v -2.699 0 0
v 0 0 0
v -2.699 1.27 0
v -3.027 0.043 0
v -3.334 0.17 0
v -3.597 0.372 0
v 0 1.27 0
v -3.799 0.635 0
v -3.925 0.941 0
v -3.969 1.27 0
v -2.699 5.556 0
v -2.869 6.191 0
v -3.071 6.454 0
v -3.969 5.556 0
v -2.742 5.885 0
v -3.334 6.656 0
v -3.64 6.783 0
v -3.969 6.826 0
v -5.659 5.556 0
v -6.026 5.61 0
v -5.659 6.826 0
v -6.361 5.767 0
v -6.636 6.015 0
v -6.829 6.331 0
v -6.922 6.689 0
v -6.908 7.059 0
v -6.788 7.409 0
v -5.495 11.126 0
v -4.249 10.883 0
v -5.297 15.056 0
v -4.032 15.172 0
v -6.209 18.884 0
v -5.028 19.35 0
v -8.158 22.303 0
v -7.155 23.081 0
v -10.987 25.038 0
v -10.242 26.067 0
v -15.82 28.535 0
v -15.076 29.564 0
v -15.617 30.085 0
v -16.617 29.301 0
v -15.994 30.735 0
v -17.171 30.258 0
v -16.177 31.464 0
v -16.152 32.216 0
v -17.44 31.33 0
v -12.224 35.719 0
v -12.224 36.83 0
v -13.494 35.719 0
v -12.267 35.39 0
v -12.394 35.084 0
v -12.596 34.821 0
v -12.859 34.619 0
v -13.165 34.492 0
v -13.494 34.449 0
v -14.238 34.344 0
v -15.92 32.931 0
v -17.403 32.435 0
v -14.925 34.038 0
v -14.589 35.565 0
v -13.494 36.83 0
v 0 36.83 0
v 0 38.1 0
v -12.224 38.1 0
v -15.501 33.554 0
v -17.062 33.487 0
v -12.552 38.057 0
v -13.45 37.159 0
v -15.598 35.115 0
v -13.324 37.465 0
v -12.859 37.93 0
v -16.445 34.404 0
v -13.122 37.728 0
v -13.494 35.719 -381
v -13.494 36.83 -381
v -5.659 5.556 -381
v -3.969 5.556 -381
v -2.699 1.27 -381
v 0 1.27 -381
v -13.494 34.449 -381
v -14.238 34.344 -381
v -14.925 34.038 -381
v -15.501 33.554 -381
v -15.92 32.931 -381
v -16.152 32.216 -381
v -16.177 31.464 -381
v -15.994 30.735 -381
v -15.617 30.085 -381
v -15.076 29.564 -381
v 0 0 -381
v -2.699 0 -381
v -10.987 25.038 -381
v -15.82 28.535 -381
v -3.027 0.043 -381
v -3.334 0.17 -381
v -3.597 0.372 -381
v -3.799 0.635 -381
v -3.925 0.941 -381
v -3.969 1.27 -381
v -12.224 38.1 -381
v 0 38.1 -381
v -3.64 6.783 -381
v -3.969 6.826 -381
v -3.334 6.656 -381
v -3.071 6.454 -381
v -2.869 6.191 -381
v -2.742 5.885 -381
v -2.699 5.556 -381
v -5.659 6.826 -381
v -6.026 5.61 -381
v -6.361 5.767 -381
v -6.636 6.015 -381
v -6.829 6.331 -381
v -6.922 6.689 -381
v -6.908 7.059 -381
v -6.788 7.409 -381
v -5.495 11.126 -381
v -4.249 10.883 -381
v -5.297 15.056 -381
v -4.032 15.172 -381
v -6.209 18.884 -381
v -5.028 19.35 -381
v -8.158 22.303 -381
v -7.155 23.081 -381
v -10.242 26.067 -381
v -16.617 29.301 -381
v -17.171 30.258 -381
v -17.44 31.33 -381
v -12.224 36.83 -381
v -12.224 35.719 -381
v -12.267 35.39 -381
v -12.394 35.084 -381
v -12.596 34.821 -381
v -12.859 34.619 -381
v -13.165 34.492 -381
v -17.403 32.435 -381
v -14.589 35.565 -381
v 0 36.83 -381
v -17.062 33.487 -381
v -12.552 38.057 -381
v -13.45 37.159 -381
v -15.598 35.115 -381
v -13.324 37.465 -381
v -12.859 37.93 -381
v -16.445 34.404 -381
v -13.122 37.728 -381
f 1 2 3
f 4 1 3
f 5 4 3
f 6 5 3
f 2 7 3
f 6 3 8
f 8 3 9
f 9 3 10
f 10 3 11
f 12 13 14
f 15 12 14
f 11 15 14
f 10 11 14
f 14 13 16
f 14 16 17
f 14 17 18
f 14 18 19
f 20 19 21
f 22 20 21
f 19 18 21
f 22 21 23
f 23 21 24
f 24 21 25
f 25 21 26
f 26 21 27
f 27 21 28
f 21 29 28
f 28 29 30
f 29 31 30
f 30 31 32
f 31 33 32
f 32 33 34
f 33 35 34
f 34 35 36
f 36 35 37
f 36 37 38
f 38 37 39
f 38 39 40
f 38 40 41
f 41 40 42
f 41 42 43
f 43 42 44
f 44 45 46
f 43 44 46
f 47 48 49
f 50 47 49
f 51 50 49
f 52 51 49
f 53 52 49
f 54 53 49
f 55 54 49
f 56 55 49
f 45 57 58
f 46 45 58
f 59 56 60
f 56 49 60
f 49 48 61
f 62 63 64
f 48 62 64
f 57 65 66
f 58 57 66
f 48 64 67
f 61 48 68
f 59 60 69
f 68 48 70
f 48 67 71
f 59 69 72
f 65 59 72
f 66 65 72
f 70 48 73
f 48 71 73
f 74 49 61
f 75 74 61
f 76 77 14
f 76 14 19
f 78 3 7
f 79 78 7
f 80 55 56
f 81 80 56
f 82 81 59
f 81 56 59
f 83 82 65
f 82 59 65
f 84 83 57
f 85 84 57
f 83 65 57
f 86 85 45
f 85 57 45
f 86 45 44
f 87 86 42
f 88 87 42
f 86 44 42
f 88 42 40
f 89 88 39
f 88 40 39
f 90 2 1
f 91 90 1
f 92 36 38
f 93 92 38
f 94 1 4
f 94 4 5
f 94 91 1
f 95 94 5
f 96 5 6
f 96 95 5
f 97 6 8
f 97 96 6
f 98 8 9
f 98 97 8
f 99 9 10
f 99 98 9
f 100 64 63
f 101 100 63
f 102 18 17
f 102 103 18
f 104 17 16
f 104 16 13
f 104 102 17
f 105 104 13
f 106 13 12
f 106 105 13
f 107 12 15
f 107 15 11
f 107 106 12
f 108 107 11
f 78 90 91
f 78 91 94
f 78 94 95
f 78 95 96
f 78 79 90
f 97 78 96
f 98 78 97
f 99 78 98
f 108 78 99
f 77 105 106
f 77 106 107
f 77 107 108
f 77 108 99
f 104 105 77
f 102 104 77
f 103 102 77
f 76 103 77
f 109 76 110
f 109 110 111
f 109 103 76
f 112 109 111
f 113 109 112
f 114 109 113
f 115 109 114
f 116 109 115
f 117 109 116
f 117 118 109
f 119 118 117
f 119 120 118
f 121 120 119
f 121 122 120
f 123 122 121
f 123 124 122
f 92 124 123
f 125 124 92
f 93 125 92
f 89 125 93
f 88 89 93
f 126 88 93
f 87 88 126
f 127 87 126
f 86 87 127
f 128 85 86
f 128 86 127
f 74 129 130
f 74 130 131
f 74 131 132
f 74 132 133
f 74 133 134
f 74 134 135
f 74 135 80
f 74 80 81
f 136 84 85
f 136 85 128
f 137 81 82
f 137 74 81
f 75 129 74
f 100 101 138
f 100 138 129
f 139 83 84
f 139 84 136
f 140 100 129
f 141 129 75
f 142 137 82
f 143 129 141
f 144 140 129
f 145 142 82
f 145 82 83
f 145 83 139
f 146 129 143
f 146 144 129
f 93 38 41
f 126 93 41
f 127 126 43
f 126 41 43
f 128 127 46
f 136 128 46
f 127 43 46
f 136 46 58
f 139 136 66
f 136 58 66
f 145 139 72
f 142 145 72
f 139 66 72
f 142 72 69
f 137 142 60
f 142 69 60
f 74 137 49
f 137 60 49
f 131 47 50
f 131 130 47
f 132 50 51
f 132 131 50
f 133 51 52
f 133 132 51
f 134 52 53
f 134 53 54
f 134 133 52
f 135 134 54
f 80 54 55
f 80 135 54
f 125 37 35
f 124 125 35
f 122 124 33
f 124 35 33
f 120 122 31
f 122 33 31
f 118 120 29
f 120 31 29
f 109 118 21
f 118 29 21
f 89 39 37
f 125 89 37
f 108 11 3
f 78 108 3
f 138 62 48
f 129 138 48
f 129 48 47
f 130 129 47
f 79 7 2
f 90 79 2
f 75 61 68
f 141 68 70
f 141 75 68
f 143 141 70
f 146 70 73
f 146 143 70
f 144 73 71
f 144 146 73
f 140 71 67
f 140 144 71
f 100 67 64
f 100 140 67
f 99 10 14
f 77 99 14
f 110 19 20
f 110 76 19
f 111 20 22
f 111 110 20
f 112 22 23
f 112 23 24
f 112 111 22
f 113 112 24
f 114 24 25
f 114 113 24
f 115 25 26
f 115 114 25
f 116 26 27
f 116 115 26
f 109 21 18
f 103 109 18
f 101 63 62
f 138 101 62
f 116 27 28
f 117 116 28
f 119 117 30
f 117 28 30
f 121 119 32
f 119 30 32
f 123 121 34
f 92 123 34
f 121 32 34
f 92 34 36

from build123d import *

# Parameters (mm, degrees)
EXTRUDE_THIN1_DEPTH = 381
FILLET1_R           = 1.27


with BuildPart() as part:
    # Sketch1 → Extrude-Thin1 (new body)
    with BuildSketch(Plane.XY):
        with BuildLine():
            Line((0, 0), (-3.96875, 0))
            Line((-3.96875, 0), (-3.96875, 5.55625))
            Line((-3.96875, 5.55625), (-7.9375, 5.55625))
            ThreePointArc((-7.9375, 5.55625), (-5.405853735, 15.931849892), (-10.986883491, 25.037585051))
            Line((-10.986883491, 25.037585051), (-15.820176145, 28.534612317))
            ThreePointArc((-15.820176145, 28.534612317), (-17.269464928, 32.972682848), (-13.49375, 35.71875))
            Line((-13.49375, 35.71875), (-13.49375, 38.1))
            Line((-13.49375, 38.1), (0, 38.1))
            Line((0, 38.1), (0, 36.83))
            Line((0, 36.83), (-12.22375, 36.83))
            Line((-12.22375, 36.83), (-12.22375, 34.13125))
            ThreePointArc((-12.22375, 34.13125), (-15.782927412, 33.179306943), (-15.075719779, 29.563536375))
            Line((-15.075719779, 29.563536375), (-10.242427125, 26.06650911))
            ThreePointArc((-10.242427125, 26.06650911), (-4.381358563, 17.296641703), (-5.659480864, 6.82625))
            Line((-5.659480864, 6.82625), (-2.69875, 6.82625))
            Line((-2.69875, 6.82625), (-2.69875, 1.27))
            Line((-2.69875, 1.27), (0, 1.27))
            Line((0, 1.27), (0, 0))
        make_face()
    extrude(amount=-EXTRUDE_THIN1_DEPTH)

    # Fillet1
    fillet1_edges = [part.edges().sort_by_distance(p)[0] for p in [
        (-3.96875, 0, -190.5),
        (-7.9375, 5.55625, -190.5),
        (-13.49375, 38.1, -190.5),
        (-12.22375, 34.13125, -190.5),
        (-2.69875, 6.82625, -190.5),
    ]]
    fillet(fillet1_edges, radius=FILLET1_R)


solid = part.part
